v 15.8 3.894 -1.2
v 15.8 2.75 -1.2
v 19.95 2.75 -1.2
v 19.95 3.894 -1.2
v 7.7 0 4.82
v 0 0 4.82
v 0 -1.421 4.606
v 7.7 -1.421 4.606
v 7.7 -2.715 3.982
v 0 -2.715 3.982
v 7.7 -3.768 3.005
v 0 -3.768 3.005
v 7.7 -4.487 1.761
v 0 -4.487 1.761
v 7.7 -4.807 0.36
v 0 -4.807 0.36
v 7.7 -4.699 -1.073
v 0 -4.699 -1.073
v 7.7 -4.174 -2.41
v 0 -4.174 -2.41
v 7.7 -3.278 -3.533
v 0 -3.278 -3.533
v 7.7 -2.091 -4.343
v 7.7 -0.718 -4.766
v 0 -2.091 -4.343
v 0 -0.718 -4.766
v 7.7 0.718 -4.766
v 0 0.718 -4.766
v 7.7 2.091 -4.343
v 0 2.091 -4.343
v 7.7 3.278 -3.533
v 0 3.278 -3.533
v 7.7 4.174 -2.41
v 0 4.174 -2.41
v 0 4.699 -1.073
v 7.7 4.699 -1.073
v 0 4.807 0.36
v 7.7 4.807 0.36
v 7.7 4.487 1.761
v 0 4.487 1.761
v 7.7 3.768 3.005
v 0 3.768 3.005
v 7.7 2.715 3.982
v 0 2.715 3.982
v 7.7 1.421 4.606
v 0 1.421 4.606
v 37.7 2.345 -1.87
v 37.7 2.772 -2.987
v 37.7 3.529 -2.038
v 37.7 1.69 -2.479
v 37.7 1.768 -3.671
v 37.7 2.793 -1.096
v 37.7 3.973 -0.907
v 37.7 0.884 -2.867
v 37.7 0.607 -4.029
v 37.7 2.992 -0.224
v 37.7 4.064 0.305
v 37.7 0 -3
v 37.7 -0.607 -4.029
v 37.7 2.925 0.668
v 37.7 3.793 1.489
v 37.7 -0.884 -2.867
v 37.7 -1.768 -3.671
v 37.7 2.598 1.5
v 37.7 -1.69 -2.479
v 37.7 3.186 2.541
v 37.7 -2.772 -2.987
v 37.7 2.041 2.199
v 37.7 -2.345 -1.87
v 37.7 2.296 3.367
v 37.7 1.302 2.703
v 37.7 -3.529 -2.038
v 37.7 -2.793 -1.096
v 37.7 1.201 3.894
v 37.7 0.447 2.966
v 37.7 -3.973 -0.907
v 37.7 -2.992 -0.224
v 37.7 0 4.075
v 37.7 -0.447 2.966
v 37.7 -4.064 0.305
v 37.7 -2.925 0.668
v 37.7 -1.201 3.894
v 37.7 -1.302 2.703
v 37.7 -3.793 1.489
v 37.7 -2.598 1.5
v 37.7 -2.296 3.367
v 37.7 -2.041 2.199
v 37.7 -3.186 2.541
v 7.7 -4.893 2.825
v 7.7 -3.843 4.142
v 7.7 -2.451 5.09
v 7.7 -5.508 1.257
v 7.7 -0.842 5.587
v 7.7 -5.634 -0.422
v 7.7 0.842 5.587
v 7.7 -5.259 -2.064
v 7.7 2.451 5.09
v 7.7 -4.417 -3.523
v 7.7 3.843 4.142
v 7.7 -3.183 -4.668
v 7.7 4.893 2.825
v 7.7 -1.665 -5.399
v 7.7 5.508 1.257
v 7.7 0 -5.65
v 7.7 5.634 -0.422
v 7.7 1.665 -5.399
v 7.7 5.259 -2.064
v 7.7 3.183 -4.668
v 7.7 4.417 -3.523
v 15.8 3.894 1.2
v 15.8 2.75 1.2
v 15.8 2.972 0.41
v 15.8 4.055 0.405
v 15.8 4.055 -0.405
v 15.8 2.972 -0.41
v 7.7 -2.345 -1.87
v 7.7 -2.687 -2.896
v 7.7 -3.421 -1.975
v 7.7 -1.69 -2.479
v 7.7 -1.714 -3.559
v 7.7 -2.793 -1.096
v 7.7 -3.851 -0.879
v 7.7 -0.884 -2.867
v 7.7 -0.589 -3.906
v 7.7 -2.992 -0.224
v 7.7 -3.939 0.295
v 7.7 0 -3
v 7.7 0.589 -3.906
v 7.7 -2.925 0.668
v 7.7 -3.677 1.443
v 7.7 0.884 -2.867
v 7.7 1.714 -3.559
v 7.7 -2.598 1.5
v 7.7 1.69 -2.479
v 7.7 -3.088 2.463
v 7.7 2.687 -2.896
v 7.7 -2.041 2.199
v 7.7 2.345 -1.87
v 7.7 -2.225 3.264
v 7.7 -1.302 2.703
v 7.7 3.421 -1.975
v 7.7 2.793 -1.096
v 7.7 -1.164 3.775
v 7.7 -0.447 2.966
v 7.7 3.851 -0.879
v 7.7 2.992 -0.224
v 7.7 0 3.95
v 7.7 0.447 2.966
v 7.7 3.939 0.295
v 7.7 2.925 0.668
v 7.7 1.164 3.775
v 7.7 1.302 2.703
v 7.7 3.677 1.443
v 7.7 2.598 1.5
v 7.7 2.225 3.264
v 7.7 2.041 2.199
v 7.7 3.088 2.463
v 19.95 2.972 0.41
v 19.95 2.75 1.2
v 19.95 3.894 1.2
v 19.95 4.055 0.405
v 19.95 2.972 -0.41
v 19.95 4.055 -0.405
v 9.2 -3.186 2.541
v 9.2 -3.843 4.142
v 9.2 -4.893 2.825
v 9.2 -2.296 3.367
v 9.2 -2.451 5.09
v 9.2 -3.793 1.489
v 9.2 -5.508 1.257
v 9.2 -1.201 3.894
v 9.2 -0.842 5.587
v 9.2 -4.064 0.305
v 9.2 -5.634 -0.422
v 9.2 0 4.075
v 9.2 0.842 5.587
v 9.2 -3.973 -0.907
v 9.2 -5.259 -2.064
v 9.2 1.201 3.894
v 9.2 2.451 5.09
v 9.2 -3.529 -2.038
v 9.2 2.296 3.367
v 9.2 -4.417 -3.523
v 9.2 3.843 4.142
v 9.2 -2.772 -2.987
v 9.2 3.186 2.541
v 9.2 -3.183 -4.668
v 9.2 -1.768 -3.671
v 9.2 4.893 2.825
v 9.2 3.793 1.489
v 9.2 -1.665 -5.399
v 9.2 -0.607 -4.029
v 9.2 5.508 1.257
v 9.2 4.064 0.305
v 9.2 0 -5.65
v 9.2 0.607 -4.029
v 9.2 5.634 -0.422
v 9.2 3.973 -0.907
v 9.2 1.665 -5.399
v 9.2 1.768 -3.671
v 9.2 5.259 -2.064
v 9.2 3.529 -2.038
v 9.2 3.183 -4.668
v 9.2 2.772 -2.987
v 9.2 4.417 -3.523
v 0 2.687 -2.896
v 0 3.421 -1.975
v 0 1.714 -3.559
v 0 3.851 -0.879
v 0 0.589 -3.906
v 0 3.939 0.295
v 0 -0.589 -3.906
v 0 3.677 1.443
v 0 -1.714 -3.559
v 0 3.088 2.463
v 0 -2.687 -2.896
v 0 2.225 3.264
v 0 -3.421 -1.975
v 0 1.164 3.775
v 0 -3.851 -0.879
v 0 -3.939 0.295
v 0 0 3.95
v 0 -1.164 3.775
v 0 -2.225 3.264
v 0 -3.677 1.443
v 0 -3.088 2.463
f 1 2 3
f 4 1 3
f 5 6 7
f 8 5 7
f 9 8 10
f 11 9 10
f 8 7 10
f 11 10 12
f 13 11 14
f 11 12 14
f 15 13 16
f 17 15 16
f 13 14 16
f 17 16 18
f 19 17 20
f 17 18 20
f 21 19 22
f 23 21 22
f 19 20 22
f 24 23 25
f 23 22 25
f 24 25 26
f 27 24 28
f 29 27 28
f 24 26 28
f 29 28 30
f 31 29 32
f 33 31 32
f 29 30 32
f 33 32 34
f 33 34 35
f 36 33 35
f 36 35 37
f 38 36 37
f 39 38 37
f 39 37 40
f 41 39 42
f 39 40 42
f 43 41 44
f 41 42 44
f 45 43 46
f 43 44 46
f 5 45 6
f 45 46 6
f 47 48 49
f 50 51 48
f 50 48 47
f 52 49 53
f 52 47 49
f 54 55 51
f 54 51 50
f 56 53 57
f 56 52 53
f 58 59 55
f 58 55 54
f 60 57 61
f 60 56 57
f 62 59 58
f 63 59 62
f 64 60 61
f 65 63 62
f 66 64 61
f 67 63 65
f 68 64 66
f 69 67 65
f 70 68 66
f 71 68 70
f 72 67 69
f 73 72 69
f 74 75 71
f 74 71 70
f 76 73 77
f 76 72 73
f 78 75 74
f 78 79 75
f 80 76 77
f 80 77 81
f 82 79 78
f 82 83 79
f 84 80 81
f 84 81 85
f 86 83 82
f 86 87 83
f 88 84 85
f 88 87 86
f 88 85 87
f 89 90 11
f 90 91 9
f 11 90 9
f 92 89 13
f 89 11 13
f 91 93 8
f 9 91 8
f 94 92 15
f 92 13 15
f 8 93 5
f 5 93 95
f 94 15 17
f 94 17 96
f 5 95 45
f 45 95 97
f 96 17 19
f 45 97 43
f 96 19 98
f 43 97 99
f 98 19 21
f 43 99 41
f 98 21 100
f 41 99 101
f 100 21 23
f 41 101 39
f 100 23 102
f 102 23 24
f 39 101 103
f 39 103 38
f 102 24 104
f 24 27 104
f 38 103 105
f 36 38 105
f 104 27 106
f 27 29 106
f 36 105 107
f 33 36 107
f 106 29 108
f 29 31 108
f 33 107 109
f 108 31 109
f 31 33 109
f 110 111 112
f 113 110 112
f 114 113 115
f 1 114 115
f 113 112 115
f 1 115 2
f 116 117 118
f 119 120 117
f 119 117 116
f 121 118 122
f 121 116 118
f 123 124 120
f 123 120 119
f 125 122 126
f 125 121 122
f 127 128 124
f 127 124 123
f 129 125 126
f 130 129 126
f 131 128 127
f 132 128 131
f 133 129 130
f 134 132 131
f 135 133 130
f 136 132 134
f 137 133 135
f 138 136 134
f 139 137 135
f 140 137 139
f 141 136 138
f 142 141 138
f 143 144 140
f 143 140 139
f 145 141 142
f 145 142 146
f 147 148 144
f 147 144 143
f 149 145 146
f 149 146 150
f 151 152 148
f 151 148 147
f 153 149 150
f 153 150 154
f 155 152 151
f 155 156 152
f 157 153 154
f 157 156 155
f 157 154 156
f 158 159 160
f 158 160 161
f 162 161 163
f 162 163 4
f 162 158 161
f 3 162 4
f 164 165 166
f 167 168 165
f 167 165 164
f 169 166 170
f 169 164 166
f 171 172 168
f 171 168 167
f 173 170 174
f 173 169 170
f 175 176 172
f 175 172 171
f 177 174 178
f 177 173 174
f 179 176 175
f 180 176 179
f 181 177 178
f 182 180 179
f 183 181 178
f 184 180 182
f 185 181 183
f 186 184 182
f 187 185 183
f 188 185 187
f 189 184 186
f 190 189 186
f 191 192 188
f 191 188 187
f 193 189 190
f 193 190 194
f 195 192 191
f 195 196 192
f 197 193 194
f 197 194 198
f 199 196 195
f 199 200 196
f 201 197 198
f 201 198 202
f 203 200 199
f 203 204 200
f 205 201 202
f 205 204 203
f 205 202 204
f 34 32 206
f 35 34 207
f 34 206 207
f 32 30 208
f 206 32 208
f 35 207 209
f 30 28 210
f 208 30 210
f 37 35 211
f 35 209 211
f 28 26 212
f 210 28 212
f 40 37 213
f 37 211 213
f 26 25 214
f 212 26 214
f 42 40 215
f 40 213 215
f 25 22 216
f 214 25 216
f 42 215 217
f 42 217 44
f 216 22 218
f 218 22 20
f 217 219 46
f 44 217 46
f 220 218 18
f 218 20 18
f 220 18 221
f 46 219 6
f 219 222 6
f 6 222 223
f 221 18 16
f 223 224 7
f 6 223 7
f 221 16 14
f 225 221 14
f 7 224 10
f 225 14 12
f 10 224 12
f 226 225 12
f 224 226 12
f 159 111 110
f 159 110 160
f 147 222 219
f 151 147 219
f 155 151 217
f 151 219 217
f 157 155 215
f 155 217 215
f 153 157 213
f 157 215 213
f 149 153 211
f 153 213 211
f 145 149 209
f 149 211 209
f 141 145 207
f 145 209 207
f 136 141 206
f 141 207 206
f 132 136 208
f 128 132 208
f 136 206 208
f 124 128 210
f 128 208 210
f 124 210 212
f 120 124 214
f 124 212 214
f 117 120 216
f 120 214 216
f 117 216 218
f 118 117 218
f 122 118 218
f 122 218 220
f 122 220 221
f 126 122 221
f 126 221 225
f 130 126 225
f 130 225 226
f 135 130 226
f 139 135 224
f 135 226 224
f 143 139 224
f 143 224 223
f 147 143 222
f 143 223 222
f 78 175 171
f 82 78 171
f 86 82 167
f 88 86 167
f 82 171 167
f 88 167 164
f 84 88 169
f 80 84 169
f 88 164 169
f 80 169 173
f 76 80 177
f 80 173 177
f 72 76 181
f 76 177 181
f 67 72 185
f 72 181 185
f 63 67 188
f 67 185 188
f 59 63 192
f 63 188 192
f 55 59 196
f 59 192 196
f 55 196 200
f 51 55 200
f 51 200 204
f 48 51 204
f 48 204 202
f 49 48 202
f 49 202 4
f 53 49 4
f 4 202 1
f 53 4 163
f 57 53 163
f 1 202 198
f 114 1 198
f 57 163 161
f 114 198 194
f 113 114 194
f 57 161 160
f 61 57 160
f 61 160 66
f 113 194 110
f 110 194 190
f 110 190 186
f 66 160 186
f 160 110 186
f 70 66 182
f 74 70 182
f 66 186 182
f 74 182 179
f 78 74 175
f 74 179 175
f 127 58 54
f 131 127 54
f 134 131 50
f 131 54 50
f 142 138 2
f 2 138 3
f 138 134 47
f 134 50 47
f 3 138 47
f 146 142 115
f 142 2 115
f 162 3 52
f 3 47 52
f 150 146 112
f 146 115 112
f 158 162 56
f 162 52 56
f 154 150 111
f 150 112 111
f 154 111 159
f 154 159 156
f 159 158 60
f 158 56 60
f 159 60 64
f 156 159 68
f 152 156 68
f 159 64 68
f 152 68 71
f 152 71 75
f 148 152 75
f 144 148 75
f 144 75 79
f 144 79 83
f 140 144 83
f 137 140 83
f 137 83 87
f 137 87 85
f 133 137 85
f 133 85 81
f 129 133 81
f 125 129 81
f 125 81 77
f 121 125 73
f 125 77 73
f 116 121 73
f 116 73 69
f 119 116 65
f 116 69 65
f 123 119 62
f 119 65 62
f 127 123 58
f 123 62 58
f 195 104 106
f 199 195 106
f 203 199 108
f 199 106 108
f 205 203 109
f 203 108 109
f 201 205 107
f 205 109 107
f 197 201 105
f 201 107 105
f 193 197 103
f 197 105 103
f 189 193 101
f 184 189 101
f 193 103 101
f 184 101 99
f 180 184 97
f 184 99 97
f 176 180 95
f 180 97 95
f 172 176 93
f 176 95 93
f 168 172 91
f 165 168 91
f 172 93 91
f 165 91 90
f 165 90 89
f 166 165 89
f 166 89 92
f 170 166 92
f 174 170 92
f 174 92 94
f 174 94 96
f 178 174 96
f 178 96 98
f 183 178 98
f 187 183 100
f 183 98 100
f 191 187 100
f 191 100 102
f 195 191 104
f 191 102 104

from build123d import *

# Parameters (mm, degrees)
SKETCH1_R           = 4.82
BOSS_EXTRUDE1_DEPTH = 7.7
SKETCH2_R           = 5.65
BOSS_EXTRUDE2_DEPTH = 1.5
SKETCH3_R           = 4.075
BOSS_EXTRUDE3_DEPTH = 28.5
SKETCH4_R           = 3
CUT_EXTRUDE1_DEPTH  = 39.537449319
SKETCH5_R           = 3.95
CUT_EXTRUDE2_DEPTH  = 7.7
SKETCH6_W           = 4.15
SKETCH6_H           = 2.4
CUT_EXTRUDE3_DEPTH  = 7.7


with BuildPart() as part:
    # Sketch1 → Boss-Extrude1 (new body)
    with BuildSketch(Plane(origin=(0, 0, 0), x_dir=(0, 0, -1), z_dir=(1, 0, 0))):
        with Locations(Location((0, 0, 0), (0, 0, 180))):
            Circle(SKETCH1_R)
    extrude(amount=BOSS_EXTRUDE1_DEPTH)

    # Sketch2 → Boss-Extrude2 (add)
    with BuildSketch(Plane(origin=(7.7, 0, 0), x_dir=(0, 0, -1), z_dir=(1, 0, 0))):
        Circle(SKETCH2_R)
    extrude(amount=BOSS_EXTRUDE2_DEPTH)

    # Sketch3 → Boss-Extrude3 (add)
    with BuildSketch(Plane(origin=(9.2, 0, 0), x_dir=(0, 0, -1), z_dir=(1, 0, 0))):
        with Locations(Location((0, 0, 0), (0, 0, 180))):
            Circle(SKETCH3_R)
    extrude(amount=BOSS_EXTRUDE3_DEPTH)

    # Sketch4 → Cut-Extrude1 (cut, through all)
    with BuildSketch(Plane(origin=(37.7, 0, 0), x_dir=(0, 0, -1), z_dir=(1, 0, 0))):
        Circle(SKETCH4_R)
    extrude(amount=-CUT_EXTRUDE1_DEPTH, mode=Mode.SUBTRACT)

    # Sketch5 → Cut-Extrude2 (cut)
    with BuildSketch(Plane.ZY):
        Circle(SKETCH5_R)
    extrude(amount=-CUT_EXTRUDE2_DEPTH, mode=Mode.SUBTRACT)

    # Sketch6 → Cut-Extrude3 (cut)
    with BuildSketch(Plane(origin=(0, 0, 0), x_dir=(1, 0, 0), z_dir=(0, 1, 0))):
        with Locations((17.875, 0)):
            Rectangle(SKETCH6_W, SKETCH6_H)
    extrude(amount=CUT_EXTRUDE3_DEPTH, mode=Mode.SUBTRACT)


solid = part.part
